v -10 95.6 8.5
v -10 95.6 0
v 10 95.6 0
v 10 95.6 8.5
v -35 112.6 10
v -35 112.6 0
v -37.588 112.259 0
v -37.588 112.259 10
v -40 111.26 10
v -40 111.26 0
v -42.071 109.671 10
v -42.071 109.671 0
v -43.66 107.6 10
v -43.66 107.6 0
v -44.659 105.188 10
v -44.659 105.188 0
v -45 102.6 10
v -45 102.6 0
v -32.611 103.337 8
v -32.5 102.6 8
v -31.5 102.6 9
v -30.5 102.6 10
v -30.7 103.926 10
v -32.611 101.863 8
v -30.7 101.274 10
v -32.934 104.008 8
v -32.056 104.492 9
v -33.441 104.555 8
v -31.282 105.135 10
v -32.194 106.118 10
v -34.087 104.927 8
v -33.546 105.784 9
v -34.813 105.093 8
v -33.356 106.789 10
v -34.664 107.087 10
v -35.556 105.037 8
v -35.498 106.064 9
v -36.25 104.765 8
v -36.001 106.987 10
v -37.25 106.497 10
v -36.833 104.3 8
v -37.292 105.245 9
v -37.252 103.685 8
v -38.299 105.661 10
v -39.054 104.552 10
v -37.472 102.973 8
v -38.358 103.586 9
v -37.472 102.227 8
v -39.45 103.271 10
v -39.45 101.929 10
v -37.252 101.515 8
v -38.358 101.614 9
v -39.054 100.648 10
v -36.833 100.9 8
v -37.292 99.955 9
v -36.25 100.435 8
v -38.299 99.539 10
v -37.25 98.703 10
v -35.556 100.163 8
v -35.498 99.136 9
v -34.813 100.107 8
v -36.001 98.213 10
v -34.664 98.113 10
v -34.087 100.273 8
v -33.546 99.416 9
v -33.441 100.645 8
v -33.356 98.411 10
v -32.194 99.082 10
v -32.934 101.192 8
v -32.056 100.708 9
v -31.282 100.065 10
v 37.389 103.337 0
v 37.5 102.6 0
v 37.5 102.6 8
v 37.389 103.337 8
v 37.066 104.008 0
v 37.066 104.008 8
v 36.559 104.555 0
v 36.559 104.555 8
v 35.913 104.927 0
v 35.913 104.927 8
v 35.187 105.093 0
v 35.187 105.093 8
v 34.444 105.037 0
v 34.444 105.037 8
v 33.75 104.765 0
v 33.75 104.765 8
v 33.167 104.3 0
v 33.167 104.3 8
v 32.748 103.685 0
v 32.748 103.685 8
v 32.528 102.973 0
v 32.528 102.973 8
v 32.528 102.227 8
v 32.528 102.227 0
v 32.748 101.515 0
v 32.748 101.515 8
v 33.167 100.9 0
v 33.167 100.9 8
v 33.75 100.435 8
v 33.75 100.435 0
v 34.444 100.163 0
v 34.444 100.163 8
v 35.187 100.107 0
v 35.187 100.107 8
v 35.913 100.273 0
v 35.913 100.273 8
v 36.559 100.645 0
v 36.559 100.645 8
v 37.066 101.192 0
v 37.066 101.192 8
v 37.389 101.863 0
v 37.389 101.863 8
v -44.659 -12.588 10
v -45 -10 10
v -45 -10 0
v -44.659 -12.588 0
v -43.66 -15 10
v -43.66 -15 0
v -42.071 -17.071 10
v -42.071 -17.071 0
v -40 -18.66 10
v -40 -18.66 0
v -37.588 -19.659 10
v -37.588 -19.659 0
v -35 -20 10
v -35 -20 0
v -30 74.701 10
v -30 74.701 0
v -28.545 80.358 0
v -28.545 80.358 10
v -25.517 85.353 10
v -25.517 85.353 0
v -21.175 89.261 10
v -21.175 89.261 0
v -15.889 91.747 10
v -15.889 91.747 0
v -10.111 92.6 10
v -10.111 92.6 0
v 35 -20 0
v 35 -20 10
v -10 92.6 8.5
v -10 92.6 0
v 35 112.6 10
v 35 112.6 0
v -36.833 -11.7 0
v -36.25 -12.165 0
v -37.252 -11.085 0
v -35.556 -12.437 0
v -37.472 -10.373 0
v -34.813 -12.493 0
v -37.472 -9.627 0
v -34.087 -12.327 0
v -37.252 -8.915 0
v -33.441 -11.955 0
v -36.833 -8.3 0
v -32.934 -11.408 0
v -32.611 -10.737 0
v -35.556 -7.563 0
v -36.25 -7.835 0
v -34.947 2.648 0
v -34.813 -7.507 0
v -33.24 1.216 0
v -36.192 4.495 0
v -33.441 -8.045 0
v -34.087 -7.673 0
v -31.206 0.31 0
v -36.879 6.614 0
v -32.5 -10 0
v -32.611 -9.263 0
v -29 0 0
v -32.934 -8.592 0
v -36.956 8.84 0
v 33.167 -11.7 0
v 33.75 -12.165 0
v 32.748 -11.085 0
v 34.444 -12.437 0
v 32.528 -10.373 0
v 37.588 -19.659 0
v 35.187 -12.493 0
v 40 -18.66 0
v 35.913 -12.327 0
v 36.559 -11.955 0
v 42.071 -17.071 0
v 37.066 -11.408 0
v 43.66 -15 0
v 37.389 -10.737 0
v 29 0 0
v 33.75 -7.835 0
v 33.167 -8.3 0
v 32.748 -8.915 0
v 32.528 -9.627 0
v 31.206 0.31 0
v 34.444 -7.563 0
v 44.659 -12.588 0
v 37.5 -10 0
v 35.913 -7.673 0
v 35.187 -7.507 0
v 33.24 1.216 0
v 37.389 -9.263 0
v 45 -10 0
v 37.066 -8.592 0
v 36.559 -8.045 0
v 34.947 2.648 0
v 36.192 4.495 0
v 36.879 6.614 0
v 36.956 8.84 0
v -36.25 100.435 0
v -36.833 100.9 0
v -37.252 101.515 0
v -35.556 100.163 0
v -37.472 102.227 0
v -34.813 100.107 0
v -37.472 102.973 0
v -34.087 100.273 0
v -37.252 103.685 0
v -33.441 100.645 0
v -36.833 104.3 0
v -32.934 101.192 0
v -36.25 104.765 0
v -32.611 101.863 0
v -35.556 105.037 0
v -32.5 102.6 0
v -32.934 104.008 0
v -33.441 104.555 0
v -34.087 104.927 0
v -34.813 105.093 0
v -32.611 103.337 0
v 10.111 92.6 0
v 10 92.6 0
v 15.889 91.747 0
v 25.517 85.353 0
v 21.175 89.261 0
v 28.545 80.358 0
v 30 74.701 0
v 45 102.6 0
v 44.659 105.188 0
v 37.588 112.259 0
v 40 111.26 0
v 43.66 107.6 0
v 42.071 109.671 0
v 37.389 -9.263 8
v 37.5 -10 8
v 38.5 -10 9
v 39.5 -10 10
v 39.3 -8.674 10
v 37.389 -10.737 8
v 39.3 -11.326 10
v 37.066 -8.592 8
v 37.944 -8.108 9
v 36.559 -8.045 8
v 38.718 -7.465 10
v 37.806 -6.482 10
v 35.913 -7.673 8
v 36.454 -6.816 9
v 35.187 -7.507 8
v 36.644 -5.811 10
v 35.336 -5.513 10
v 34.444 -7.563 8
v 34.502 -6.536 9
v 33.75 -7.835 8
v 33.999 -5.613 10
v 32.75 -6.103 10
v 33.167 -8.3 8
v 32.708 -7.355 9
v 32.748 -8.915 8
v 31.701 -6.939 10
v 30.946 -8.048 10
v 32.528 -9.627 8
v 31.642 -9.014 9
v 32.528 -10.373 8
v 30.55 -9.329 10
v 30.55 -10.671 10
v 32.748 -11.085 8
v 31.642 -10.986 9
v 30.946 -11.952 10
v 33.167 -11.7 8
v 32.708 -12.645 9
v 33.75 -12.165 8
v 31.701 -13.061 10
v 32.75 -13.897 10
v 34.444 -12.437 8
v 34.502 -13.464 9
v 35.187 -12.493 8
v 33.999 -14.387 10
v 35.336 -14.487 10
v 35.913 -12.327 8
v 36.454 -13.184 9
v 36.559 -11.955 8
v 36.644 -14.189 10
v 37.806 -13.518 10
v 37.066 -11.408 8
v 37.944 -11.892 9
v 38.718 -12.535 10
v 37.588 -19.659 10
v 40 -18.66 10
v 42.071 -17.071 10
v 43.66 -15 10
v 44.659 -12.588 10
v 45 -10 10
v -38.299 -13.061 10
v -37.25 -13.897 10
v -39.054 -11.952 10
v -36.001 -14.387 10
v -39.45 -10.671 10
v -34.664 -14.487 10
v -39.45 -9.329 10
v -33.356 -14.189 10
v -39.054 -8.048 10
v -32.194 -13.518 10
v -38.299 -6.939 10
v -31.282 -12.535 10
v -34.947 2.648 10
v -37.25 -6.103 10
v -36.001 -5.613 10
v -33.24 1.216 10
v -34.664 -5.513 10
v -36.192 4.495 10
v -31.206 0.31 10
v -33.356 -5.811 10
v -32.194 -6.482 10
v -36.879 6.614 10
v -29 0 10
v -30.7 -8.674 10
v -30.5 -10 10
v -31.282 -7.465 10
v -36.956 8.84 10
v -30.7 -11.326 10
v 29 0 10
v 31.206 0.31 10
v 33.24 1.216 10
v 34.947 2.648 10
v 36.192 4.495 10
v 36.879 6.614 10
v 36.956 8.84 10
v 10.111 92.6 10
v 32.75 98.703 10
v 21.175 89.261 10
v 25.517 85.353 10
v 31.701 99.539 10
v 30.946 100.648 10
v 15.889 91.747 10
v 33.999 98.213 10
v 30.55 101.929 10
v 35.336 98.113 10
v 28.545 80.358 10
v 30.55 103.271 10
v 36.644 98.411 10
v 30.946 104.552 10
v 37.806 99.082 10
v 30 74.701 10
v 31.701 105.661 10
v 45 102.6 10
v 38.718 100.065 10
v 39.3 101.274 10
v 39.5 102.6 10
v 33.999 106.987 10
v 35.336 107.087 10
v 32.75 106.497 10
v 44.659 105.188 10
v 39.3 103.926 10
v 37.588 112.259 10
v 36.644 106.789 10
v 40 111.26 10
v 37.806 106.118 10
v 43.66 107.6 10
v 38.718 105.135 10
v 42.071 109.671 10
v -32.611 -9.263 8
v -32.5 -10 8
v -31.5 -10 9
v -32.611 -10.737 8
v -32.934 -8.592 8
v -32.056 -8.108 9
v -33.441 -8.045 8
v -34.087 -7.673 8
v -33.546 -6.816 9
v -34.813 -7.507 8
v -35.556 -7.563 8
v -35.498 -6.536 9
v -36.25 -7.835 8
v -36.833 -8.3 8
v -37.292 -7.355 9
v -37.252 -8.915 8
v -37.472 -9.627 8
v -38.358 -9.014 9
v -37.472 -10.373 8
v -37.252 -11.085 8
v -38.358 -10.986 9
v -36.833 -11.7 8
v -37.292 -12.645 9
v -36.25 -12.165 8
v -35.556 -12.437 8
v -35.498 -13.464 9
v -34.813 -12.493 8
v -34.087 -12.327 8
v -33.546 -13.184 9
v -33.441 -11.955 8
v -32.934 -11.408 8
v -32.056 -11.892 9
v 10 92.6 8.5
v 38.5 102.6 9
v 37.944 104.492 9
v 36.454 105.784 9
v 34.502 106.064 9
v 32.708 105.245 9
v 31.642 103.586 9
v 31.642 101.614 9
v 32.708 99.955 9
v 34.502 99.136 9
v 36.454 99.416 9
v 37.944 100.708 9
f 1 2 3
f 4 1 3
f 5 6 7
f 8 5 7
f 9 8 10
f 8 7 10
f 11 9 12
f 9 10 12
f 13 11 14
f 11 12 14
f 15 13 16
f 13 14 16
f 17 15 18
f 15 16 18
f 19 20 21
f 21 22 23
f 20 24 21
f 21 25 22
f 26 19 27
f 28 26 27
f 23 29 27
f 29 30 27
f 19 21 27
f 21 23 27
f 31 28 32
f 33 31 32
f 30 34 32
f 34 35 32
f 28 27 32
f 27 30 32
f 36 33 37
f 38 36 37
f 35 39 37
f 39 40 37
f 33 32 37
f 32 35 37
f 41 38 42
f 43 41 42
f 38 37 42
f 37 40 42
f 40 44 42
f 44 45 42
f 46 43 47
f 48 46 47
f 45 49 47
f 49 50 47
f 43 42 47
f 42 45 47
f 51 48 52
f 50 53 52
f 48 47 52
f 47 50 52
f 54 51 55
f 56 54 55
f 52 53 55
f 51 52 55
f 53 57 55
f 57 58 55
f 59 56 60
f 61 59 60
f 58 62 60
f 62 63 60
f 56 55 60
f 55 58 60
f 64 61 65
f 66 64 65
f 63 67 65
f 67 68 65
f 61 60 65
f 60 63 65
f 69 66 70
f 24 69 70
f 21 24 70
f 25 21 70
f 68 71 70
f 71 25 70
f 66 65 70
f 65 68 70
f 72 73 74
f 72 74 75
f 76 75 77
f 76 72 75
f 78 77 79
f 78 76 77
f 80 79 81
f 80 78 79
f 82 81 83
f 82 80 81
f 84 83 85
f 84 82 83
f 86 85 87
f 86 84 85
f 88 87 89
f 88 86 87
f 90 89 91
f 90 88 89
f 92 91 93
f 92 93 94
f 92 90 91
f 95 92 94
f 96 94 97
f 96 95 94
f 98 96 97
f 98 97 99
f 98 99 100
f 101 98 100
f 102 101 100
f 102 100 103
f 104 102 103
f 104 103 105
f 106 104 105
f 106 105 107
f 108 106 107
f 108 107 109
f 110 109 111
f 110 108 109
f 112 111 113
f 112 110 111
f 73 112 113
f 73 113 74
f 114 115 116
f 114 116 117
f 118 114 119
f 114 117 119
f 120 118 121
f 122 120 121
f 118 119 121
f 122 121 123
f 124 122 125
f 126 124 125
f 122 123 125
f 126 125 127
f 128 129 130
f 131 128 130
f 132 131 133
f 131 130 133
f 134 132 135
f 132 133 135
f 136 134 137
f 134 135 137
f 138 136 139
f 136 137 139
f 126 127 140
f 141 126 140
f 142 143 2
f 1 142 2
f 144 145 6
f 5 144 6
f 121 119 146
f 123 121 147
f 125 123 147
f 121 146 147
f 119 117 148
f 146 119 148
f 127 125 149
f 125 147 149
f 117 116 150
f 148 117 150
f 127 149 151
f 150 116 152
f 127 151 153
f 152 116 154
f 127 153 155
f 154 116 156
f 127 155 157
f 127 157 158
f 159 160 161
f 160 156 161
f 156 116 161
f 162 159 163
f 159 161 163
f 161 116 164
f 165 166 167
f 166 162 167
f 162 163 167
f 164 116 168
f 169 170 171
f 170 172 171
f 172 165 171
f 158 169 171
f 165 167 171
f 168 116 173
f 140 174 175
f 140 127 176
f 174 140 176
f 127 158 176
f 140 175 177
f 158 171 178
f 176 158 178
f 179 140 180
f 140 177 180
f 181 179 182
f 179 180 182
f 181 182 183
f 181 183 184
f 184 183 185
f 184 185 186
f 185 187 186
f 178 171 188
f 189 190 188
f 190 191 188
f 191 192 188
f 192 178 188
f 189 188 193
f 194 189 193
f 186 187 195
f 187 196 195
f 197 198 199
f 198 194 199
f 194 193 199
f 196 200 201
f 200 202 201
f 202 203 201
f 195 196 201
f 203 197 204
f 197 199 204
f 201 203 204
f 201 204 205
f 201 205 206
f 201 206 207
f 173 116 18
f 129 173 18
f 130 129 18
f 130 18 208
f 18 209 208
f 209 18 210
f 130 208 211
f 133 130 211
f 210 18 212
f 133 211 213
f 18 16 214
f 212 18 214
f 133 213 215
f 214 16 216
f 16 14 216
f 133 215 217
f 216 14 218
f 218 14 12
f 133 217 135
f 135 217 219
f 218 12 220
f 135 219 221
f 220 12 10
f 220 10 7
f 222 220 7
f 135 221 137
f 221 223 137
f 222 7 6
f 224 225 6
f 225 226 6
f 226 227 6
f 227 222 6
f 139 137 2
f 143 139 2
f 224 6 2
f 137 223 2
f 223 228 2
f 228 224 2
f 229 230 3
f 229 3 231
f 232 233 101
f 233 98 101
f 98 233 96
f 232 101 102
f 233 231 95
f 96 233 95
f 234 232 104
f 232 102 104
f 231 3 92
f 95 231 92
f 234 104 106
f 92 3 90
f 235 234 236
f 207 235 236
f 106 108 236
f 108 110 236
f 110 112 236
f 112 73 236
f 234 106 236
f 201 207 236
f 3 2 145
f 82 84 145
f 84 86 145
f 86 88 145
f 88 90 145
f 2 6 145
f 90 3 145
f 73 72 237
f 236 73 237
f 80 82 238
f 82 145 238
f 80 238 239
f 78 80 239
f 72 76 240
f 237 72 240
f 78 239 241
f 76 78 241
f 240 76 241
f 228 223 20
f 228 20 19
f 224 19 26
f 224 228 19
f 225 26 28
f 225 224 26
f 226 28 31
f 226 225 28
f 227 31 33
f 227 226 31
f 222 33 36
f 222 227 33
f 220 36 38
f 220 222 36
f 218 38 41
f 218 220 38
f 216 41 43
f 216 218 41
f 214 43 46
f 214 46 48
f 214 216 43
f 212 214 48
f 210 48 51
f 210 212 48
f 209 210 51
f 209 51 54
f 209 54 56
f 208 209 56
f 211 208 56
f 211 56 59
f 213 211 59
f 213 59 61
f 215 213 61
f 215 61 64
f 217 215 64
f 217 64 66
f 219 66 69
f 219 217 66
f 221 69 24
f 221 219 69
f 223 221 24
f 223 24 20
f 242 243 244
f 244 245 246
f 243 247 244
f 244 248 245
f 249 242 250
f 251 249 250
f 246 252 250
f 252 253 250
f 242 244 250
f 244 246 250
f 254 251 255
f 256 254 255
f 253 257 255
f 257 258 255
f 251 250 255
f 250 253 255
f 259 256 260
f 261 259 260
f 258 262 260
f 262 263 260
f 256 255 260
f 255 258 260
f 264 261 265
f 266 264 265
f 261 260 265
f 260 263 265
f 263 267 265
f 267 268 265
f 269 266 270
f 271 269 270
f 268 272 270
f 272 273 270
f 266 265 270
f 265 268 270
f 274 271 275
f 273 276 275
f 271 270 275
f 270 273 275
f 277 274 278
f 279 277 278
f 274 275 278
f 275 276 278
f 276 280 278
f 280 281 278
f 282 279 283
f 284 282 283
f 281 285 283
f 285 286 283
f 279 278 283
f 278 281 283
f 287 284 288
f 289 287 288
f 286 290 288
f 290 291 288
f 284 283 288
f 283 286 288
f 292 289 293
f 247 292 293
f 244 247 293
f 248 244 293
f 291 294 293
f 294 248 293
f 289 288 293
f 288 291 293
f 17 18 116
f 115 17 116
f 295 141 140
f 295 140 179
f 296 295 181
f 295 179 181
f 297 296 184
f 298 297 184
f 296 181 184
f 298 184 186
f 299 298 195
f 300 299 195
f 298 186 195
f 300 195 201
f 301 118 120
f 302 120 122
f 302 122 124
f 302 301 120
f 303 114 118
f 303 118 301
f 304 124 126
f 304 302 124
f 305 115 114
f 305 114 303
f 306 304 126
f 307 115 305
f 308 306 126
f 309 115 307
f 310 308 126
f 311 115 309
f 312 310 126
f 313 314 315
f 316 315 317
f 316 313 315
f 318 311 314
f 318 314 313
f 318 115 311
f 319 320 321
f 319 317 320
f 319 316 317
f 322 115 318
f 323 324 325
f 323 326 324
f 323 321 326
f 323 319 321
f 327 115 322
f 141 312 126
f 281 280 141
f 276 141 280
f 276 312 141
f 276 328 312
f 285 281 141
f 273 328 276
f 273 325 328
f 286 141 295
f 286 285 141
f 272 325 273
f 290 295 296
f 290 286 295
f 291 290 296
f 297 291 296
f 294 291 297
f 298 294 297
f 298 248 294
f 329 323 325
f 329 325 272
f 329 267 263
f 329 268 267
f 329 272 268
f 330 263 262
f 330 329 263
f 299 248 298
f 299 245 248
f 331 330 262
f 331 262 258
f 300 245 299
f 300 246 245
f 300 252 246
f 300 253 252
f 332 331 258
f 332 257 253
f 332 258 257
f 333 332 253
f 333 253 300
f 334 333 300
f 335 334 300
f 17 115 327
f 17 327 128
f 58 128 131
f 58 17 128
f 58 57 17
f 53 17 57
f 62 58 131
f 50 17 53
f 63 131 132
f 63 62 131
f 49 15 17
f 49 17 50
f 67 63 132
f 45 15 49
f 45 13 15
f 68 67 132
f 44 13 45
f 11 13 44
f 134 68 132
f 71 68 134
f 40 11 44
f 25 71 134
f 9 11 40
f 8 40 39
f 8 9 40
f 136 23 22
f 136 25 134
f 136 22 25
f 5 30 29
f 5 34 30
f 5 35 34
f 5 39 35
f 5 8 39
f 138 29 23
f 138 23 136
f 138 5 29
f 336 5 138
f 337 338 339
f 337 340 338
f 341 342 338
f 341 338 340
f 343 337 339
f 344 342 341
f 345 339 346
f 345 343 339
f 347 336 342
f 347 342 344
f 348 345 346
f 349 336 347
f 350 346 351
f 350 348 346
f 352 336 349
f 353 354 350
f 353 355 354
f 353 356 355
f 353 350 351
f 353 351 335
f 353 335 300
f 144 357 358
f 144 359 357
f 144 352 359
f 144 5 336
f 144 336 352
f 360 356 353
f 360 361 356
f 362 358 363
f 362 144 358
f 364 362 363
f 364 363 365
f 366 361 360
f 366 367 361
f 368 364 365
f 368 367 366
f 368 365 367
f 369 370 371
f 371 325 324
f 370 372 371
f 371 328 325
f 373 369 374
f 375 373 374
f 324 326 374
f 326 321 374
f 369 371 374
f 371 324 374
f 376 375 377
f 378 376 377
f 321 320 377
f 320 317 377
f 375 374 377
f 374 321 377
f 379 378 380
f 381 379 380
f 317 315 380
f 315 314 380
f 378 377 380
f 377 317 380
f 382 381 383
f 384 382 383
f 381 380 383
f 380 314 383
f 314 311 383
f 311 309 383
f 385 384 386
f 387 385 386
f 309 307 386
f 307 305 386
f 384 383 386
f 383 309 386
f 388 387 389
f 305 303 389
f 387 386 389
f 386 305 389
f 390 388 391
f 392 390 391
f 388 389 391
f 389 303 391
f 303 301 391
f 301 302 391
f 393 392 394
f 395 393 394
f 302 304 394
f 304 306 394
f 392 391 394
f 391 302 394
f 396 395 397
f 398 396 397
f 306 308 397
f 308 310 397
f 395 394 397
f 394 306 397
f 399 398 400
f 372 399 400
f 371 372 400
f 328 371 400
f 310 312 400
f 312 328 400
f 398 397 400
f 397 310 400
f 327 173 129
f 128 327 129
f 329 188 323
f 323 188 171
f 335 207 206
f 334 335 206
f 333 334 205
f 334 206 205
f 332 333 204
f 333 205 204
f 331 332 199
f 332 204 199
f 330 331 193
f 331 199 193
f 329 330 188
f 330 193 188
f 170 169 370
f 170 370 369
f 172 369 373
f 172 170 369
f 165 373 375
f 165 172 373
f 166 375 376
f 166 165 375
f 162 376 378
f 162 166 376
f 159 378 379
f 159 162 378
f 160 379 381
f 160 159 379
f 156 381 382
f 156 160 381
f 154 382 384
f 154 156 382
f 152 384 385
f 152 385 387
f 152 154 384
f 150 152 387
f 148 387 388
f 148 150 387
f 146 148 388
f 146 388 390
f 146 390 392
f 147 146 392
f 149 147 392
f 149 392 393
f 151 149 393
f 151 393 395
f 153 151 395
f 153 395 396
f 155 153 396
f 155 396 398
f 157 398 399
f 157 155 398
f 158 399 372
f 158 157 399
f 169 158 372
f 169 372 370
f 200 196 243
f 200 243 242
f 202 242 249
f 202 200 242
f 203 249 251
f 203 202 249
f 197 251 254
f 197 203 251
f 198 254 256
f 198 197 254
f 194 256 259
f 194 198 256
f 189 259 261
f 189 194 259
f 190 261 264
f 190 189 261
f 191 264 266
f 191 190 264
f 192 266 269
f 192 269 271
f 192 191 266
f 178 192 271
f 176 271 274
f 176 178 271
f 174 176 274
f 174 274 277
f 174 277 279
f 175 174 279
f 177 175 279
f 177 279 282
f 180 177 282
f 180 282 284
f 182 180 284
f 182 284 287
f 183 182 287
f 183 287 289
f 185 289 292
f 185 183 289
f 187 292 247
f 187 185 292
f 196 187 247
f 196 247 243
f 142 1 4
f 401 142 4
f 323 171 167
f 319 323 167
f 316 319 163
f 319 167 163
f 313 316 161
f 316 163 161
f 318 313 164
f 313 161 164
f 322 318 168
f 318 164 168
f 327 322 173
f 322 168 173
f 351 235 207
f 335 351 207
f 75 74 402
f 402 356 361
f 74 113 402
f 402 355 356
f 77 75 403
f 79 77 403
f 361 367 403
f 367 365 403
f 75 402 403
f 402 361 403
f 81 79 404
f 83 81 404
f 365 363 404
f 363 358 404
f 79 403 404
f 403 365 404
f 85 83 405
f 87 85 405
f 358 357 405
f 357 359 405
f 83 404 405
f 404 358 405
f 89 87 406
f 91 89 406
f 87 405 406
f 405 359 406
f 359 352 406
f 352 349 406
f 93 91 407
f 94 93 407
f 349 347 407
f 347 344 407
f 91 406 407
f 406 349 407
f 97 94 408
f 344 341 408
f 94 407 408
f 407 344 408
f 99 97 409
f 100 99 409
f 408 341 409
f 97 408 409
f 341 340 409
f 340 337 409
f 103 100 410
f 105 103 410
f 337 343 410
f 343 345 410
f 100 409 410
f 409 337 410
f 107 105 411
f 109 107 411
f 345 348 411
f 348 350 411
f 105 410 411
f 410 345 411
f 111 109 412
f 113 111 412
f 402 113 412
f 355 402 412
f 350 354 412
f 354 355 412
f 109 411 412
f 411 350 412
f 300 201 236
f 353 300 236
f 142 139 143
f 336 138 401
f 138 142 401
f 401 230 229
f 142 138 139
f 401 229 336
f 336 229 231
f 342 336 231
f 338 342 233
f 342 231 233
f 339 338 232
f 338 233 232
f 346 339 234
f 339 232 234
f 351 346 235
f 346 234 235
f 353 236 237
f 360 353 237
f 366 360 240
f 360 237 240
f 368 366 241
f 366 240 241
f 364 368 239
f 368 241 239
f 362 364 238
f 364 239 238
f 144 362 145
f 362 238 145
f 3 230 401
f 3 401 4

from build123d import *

# Parameters (mm, degrees)
F0_R     = 2.5
F0_W     = 20
F0_H     = 3
F1_DEPTH = 10
F2_SIZE  = 2
F3_DEPTH = 8.5


with BuildPart() as f1:
    # F0 (on Top) → F1 (new body)
    with BuildSketch(Plane.XY):
        with BuildLine():
            ThreePointArc((-45, -10), (-42.0710678119, -17.0710678119), (-35, -20))
            Line((-35, -20), (35, -20))
            ThreePointArc((35, -20), (42.0710678119, -17.0710678119), (45, -10))
            Line((45, -10), (45, 102.6))
            ThreePointArc((45, 102.6), (42.0710678119, 109.6710678119), (35, 112.6))
            Line((35, 112.6), (-35, 112.6))
            ThreePointArc((-35, 112.6), (-42.0710678119, 109.6710678119), (-45, 102.6))
            Line((-45, 102.6), (-45, -10))
        make_face()
        with Locations((-35, -10)):
            Circle(F0_R, mode=Mode.SUBTRACT)
        with Locations((35, -10)):
            Circle(F0_R, mode=Mode.SUBTRACT)
        with Locations((-35, 102.6)):
            Circle(F0_R, mode=Mode.SUBTRACT)
        with BuildLine():
            ThreePointArc((-30, 74.7005903715), (-23.489485432, 87.4662673094), (-10.1106179057, 92.6))
            Line((-10.1106179057, 92.6), (-10, 92.6))
            Line((-10, 92.6), (-10, 95.6))
            Line((-10, 95.6), (10, 95.6))
            Line((10, 95.6), (10, 92.6))
            Line((10, 92.6), (10.1106179057, 92.6))
            ThreePointArc((10.1106179057, 92.6), (23.489485432, 87.4662673094), (30, 74.7005903715))
            Line((30, 74.7005903715), (36.9557528377, 8.8402361486))
            ThreePointArc((36.9557528377, 8.8402361486), (34.9465069238, 2.6484529895), (29, 0))
            Line((29, 0), (-29, 0))
            ThreePointArc((-29, 0), (-34.9465069238, 2.6484529895), (-36.9557528377, 8.8402361486))
            Line((-36.9557528377, 8.8402361486), (-30, 74.7005903715))
        make_face(mode=Mode.SUBTRACT)
        with Locations((35, 102.6)):
            Circle(F0_R, mode=Mode.SUBTRACT)
        with Locations((0, 94.1)):
            Rectangle(F0_W, F0_H)
    extrude(amount=F1_DEPTH)

    # F2
    f2_edges = [f1.edges().sort_by_distance(p)[0] for p in [
        (-37.5, -10, 10),
        (32.5, -10, 10),
        (32.5, 102.6, 10),
        (-37.5, 102.6, 10),
    ]]
    chamfer(f2_edges, length=F2_SIZE)

    # F0 (on Top) → F3 (cut)
    with BuildSketch(Plane.XY):
        with Locations((0, 94.1)):
            Rectangle(F0_W, F0_H)
    extrude(amount=F3_DEPTH, mode=Mode.SUBTRACT)


solid = f1.part
